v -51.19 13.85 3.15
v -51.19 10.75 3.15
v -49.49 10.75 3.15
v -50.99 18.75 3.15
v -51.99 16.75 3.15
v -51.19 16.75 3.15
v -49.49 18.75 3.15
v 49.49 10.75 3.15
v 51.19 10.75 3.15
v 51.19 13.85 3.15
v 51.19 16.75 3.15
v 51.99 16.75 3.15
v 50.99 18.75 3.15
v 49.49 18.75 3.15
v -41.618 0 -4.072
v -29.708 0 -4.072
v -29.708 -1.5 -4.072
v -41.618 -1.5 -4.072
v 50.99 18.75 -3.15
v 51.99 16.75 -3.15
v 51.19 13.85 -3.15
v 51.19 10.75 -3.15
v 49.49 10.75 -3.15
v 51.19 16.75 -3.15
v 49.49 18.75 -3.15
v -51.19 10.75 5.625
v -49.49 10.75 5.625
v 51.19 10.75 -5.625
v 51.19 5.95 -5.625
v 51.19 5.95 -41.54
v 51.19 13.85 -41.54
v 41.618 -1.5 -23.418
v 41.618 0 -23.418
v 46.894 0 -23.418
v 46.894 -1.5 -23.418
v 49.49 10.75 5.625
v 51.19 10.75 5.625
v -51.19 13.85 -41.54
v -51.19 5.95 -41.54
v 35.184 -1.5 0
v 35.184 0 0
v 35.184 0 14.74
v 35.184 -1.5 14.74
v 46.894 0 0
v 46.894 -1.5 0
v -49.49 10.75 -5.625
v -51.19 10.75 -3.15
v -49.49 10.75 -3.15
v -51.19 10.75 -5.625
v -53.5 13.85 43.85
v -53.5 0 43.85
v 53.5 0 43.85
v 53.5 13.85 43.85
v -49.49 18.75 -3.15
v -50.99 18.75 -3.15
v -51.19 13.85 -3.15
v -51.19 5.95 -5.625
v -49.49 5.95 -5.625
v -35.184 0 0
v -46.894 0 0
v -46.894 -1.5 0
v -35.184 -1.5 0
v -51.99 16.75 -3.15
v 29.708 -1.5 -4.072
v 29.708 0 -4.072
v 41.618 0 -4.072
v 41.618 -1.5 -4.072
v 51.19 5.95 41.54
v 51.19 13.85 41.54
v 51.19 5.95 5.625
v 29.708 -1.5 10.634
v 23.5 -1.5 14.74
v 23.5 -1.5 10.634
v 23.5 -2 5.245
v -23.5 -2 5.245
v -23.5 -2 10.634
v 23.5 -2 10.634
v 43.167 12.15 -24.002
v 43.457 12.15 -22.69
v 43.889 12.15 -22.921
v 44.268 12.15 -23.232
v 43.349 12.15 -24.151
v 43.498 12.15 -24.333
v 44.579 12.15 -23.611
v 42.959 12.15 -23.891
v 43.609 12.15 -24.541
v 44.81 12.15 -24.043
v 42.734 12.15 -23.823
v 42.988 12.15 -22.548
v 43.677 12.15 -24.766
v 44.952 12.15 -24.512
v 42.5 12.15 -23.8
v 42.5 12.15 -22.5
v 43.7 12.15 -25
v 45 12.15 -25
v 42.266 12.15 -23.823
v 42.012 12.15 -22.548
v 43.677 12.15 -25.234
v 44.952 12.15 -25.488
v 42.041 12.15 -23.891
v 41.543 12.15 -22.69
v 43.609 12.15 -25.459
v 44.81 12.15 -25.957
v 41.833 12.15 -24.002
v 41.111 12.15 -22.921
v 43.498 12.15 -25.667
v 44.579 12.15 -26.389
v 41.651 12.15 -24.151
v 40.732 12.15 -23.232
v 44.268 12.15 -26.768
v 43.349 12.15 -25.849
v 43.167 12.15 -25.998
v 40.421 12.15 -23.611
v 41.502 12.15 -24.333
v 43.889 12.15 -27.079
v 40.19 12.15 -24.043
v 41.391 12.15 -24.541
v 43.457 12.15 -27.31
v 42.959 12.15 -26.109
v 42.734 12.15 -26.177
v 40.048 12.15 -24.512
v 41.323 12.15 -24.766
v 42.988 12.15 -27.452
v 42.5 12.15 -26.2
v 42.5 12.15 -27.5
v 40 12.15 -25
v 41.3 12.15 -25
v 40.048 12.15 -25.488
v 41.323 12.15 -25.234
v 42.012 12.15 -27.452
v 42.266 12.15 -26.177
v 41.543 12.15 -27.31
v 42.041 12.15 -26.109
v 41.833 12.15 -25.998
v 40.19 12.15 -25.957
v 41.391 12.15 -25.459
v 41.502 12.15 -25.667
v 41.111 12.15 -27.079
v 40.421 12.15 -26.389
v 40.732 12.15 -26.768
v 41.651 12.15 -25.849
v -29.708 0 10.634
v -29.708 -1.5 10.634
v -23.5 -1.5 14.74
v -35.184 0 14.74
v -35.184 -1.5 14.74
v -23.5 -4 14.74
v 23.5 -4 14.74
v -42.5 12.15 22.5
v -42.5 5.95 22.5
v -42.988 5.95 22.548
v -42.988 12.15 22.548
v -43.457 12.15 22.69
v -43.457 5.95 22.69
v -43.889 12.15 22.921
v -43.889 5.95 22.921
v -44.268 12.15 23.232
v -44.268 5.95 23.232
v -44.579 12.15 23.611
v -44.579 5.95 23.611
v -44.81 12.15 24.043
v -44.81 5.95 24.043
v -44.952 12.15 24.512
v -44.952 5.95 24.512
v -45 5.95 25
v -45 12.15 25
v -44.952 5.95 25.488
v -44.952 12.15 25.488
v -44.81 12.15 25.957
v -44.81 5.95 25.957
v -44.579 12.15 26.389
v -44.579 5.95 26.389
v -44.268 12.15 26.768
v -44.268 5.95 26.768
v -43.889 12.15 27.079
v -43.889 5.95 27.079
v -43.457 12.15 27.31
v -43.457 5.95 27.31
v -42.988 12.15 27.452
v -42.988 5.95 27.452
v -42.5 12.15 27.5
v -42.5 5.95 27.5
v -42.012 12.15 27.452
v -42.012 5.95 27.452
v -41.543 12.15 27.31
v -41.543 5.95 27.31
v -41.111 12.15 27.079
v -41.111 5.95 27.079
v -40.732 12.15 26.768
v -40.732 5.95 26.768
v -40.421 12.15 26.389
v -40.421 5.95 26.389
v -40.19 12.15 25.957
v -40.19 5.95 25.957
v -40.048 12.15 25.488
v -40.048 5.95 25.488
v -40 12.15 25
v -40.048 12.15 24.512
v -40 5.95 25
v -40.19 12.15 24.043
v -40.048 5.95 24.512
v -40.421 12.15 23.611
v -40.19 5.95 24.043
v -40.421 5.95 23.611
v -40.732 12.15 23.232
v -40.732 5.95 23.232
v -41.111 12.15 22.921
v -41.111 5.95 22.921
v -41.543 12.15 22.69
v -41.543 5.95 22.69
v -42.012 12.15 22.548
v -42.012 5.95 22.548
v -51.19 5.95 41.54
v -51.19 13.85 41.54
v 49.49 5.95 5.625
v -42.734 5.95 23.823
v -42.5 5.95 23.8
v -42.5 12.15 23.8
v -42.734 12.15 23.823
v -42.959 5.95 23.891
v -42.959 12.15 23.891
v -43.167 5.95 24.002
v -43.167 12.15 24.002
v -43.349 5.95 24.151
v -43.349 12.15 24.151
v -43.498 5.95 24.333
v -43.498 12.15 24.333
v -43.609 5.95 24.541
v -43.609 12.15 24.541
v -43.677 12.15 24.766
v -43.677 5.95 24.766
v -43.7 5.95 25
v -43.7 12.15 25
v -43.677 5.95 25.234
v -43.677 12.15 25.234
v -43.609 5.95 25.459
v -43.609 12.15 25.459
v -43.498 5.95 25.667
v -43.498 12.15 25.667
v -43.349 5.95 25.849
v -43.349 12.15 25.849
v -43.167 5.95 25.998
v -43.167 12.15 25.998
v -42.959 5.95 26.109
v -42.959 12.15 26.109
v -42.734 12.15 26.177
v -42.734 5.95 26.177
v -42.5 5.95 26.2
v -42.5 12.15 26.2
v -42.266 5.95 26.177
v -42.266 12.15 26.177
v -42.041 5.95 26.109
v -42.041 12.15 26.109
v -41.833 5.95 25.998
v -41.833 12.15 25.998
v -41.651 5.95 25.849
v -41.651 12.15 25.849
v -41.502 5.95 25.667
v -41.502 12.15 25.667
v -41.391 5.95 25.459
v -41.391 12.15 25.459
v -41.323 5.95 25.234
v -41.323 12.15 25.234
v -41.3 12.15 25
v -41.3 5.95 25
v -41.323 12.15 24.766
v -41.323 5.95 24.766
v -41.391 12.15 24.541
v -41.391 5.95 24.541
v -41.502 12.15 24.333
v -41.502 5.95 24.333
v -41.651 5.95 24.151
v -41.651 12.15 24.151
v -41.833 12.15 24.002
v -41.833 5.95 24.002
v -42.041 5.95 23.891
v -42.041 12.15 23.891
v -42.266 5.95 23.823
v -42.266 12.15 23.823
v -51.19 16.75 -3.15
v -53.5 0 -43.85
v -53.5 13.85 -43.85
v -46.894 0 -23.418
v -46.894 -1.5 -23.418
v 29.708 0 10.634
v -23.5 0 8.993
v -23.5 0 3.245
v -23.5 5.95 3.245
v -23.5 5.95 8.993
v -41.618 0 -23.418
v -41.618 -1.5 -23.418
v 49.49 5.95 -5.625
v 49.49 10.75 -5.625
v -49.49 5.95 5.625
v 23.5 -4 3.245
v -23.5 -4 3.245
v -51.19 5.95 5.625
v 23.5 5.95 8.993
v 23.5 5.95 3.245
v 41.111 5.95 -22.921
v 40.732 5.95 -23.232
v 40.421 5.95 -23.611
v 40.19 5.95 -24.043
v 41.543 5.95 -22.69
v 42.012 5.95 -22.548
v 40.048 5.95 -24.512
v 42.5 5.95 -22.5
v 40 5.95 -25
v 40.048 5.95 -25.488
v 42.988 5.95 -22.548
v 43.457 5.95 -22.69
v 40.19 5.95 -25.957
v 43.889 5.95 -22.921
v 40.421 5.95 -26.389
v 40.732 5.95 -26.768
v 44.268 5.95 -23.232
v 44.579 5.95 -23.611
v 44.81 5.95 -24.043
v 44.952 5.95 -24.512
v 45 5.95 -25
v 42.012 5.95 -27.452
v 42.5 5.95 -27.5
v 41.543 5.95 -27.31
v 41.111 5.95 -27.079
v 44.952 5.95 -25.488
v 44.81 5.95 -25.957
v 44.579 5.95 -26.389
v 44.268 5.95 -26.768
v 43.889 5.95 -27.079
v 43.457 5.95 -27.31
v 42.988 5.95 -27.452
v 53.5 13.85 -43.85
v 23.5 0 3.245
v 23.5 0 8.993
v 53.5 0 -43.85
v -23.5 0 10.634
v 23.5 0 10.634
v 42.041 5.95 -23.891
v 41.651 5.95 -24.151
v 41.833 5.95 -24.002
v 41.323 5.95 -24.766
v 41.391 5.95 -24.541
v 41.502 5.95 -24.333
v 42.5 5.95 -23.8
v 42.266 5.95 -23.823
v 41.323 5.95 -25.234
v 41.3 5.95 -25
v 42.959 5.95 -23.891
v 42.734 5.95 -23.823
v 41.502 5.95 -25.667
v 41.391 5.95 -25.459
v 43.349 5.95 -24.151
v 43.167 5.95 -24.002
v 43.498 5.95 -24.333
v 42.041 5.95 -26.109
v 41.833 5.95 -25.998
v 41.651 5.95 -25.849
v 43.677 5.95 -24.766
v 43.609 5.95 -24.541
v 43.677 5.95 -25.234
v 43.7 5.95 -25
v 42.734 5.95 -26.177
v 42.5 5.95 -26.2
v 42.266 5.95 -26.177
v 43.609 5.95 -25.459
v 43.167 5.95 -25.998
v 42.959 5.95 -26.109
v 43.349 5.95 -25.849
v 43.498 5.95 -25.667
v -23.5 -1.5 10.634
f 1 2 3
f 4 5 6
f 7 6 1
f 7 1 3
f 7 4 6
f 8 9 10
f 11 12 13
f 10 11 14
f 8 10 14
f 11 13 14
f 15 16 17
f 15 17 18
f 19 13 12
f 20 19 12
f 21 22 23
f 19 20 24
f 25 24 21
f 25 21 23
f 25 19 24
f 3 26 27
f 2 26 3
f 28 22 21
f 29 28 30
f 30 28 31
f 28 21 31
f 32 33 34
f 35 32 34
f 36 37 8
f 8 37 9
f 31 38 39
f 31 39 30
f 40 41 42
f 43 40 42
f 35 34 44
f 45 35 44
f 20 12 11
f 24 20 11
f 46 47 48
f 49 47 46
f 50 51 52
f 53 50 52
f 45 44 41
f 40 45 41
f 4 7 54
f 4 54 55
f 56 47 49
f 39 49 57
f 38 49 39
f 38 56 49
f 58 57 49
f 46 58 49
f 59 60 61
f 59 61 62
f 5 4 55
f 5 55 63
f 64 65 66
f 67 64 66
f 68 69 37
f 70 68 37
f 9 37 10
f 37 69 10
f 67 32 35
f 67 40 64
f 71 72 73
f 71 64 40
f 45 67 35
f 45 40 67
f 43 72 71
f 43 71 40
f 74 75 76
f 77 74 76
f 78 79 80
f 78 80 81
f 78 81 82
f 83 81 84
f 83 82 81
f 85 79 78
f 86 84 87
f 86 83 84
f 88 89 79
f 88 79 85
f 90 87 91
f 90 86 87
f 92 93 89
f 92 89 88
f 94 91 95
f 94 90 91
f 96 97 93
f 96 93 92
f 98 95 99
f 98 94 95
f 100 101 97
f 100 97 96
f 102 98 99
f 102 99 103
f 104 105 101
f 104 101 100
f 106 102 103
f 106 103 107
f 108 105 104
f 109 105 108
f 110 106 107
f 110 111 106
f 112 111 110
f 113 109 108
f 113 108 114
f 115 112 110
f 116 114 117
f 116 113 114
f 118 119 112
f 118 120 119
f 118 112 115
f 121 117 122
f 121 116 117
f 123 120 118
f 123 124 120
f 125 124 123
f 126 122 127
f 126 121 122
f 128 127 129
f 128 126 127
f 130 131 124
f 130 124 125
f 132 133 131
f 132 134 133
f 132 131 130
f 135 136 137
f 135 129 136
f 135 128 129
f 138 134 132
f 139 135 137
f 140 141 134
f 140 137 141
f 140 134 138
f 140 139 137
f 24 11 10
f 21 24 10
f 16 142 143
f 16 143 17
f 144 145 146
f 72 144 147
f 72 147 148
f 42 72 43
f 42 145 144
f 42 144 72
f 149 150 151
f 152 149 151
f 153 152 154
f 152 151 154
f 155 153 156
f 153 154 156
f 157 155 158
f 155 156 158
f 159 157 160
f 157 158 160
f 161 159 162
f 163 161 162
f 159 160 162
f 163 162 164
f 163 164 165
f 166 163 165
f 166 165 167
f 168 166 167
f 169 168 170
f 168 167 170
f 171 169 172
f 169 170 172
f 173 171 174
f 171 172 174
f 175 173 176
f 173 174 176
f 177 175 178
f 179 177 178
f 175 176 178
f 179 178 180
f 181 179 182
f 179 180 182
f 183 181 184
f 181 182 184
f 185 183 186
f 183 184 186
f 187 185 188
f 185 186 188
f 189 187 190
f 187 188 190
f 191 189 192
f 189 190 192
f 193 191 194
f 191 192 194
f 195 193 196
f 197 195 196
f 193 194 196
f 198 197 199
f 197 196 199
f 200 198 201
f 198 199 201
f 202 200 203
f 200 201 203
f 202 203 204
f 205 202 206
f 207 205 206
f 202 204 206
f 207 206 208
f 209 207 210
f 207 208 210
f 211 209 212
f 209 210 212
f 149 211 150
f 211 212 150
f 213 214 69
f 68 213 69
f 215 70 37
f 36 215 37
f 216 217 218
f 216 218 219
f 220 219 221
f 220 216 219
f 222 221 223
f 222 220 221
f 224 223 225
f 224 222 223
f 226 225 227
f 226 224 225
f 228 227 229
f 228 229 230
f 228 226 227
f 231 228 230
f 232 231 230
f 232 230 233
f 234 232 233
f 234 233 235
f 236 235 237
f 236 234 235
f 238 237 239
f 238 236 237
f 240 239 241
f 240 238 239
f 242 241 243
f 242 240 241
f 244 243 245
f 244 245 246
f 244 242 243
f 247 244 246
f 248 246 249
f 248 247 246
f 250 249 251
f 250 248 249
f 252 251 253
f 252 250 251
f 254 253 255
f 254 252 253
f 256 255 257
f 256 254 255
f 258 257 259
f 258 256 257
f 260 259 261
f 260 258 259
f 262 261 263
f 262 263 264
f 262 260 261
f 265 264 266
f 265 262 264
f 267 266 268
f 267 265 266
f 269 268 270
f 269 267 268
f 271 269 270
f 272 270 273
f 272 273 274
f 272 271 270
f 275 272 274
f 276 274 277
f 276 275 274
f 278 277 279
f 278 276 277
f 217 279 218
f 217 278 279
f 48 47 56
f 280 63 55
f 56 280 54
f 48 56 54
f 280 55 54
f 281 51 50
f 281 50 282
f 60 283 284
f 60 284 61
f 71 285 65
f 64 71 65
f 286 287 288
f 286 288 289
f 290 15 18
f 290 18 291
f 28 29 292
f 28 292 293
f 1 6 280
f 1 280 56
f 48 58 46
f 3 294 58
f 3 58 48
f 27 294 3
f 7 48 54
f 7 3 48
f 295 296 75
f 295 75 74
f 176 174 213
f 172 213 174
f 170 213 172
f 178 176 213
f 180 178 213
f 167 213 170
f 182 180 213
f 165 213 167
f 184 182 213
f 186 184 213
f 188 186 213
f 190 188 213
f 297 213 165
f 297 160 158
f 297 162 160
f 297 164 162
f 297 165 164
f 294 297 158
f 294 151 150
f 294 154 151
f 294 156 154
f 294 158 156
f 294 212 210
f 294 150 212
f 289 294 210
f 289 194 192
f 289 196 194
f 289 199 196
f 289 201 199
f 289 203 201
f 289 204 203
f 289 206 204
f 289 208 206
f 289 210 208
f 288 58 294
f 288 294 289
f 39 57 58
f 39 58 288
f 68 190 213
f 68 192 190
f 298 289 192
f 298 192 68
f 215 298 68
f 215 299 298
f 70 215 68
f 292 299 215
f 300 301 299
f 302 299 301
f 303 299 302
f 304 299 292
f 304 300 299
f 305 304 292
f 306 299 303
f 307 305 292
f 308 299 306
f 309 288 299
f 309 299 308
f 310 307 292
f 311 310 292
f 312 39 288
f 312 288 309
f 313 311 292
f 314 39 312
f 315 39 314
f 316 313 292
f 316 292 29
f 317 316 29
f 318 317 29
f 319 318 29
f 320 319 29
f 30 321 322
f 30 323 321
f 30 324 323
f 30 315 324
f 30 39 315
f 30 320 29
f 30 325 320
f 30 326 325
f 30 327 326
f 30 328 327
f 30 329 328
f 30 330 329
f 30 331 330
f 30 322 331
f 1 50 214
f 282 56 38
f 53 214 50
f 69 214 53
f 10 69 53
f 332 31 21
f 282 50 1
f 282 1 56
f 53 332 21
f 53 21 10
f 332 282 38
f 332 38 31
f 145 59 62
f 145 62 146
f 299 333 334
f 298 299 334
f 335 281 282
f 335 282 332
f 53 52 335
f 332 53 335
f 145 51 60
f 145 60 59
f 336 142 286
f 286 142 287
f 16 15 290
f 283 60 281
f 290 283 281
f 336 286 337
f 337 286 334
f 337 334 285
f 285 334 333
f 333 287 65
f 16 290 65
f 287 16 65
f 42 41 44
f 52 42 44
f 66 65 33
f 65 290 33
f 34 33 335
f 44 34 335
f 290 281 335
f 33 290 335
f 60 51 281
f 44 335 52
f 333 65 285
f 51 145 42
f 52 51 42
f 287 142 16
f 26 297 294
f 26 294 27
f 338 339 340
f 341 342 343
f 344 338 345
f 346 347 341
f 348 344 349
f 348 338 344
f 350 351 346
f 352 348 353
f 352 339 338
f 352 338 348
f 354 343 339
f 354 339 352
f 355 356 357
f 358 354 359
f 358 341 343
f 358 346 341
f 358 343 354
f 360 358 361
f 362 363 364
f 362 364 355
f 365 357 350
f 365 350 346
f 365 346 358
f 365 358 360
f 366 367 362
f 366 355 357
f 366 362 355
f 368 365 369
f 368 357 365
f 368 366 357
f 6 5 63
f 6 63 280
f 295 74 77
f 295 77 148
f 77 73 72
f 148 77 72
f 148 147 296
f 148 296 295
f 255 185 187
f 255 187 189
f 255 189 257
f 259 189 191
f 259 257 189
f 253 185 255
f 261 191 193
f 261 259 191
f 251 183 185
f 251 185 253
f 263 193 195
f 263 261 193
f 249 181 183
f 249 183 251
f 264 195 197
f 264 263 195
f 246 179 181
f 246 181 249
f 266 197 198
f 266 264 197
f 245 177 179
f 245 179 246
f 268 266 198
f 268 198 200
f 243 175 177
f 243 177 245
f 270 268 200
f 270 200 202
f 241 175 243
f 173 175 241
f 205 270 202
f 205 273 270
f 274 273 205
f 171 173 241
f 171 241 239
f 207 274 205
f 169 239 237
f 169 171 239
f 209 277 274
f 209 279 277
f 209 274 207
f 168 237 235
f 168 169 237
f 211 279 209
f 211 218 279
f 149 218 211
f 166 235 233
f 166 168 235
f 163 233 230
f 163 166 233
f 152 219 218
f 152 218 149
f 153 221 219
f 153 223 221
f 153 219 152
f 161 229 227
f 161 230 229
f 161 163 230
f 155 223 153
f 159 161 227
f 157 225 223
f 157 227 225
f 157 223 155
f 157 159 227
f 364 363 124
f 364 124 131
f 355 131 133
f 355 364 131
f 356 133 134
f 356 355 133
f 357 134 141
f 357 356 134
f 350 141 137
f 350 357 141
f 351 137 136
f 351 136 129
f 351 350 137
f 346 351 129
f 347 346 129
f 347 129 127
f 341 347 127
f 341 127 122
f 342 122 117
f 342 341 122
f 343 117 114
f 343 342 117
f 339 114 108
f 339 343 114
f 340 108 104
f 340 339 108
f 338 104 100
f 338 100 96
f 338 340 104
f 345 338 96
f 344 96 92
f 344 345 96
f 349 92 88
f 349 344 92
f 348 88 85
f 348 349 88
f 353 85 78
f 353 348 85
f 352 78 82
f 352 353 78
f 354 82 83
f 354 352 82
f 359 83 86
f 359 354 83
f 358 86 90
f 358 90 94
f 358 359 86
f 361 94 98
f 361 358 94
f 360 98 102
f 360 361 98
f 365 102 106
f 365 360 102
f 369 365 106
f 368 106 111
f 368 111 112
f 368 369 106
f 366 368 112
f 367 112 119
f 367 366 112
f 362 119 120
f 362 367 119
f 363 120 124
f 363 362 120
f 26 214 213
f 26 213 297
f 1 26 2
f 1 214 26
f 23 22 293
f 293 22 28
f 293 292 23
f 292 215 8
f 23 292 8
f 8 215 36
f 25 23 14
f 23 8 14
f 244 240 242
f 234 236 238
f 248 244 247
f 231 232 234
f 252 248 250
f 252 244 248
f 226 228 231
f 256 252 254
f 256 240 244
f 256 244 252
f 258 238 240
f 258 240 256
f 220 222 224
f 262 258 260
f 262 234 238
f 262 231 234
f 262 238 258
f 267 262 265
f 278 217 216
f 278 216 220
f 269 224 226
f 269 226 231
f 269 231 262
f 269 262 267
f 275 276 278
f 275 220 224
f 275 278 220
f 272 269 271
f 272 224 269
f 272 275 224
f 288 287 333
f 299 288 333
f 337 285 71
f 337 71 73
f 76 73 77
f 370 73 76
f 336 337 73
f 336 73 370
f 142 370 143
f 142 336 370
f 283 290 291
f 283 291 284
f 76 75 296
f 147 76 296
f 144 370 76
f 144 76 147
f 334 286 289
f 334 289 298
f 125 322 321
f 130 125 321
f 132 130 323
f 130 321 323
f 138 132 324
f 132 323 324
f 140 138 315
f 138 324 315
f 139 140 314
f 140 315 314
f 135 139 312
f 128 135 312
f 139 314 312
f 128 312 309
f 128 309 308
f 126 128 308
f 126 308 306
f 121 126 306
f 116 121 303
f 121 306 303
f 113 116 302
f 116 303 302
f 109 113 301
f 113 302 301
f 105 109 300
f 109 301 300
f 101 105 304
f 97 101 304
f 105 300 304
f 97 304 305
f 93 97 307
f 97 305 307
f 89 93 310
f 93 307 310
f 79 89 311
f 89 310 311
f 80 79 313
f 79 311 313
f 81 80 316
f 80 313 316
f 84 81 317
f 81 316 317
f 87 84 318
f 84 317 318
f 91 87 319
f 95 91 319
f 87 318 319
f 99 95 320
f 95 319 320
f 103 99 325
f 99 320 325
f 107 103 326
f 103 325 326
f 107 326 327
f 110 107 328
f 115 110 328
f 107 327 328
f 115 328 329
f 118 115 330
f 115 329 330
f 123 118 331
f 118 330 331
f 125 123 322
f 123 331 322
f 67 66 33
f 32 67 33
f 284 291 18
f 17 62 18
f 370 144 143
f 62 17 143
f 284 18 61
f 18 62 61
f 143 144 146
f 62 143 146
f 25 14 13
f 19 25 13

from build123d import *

# Parameters (mm, degrees)
SKETCH1_W           = 107
SKETCH1_H           = 87.7
BOSS_EXTRUDE1_DEPTH = 13.85
SKETCH2_W           = 102.38
SKETCH2_H           = 83.08
CUT_EXTRUDE1_DEPTH  = 7.9
SKETCH4_R           = 2.5
SKETCH4_R_2         = 1.2
BOSS_EXTRUDE2_DEPTH = 6.2
SKETCH7_W           = 11.25
SKETCH7_H           = 4.8
BOSS_EXTRUDE3_DEPTH = 1.7
BOSS_EXTRUDE4_DEPTH = 3.15
SKETCH3_W           = 23.5
SKETCH3_H           = 11.494748732
BOSS_EXTRUDE5_DEPTH = 4
SKETCH9_W           = 7.388623973
SKETCH9_H           = 2
CUT_EXTRUDE2_DEPTH  = 91.572539989
SKETCH10_W          = 47
SKETCH10_H          = 5.747374366
CUT_EXTRUDE4_DEPTH  = 72.670321612
CHAMFER1_SIZE       = 2
BOSS_EXTRUDE7_DEPTH = 1.5


with BuildPart() as part:
    # Sketch1 → Boss-Extrude1 (new body)
    with BuildSketch(Plane(origin=(0, 0, 0), x_dir=(1, 0, 0), z_dir=(0, 1, 0))):
        Rectangle(SKETCH1_W, SKETCH1_H)
    extrude(amount=BOSS_EXTRUDE1_DEPTH)

    # Sketch2 → Cut-Extrude1 (cut)
    with BuildSketch(Plane(origin=(0, 13.85, 0), x_dir=(1, 0, 0), z_dir=(0, 1, 0))):
        Rectangle(SKETCH2_W, SKETCH2_H)
    extrude(amount=-CUT_EXTRUDE1_DEPTH, mode=Mode.SUBTRACT)

    # Sketch4 → Boss-Extrude2 (add)
    # profile 1 of 2: a face of its own
    with BuildSketch(Plane(origin=(0, 5.95, 0), x_dir=(1, 0, 0), z_dir=(0, 1, 0))):
        with Locations(Location((-42.5, -25, 0), (0, 0, 90))):
            Circle(SKETCH4_R)
        with Locations(Location((-42.5, -25, 0), (0, 0, 90))):
            Circle(SKETCH4_R_2, mode=Mode.SUBTRACT)
    # profile 2 of 2: a face of its own
    with BuildSketch(Plane(origin=(0, 5.95, 0), x_dir=(1, 0, 0), z_dir=(0, 1, 0))):
        with Locations(Location((42.5, 25, 0), (0, 0, 90))):
            Circle(SKETCH4_R)
        with Locations(Location((42.5, 25, 0), (0, 0, 90))):
            Circle(SKETCH4_R_2, mode=Mode.SUBTRACT)
    extrude(amount=BOSS_EXTRUDE2_DEPTH)

    # Sketch7 → Boss-Extrude3 (add)
    with BuildSketch(Plane(origin=(-51.19, 0, 0), x_dir=(0, 0, -1), z_dir=(1, 0, 0))):
        with Locations((0, 8.35)):
            Rectangle(SKETCH7_W, SKETCH7_H)
    boss_extrude3 = extrude(amount=BOSS_EXTRUDE3_DEPTH)

    # Sketch8 → Boss-Extrude4 (add, symmetric)
    with BuildSketch(Plane.XY):
        Polygon((-49.49, 10.75), (-49.49, 18.75), (-50.99, 18.75), (-51.99, 16.75), (-51.19, 16.75), (-51.19, 10.75), align=None)
    boss_extrude4 = extrude(amount=BOSS_EXTRUDE4_DEPTH, both=True)

    # Sketch3 → Boss-Extrude5 (add)
    with BuildSketch(Plane.XZ):
        with Locations((-11.75, 8.992625634)):
            Rectangle(SKETCH3_W, SKETCH3_H)
        with Locations((11.75, 8.992625634)):
            Rectangle(SKETCH3_W, SKETCH3_H)
    extrude(amount=BOSS_EXTRUDE5_DEPTH)

    # Sketch9 → Cut-Extrude2 (cut, through all)
    with BuildSketch(Plane.ZY.offset(23.5)):
        with Locations((6.939563255, -1)):
            Rectangle(SKETCH9_W, SKETCH9_H)
    extrude(amount=-CUT_EXTRUDE2_DEPTH, mode=Mode.SUBTRACT)

    # Sketch10 → Cut-Extrude4 (cut, through all)
    with BuildSketch(Plane.XZ):
        with Locations((0, 6.118938451)):
            Rectangle(SKETCH10_W, SKETCH10_H)
    extrude(amount=-CUT_EXTRUDE4_DEPTH, mode=Mode.SUBTRACT)

    # Chamfer1
    chamfer1_edges = [part.edges().sort_by_distance(p)[0] for p in [
        (0, -2, 3.245251268),
    ]]
    chamfer(chamfer1_edges, length=CHAMFER1_SIZE - 0.0001)  # a hair under: the kernel refuses the full size

    # Mirror1: Boss-Extrude3, Boss-Extrude4 across plane
    add(boss_extrude3.mirror(Plane(origin=(0, 0, 0), x_dir=(0, 0, 1), z_dir=(1, 0, 0))))
    add(boss_extrude4.mirror(Plane(origin=(0, 0, 0), x_dir=(0, 0, 1), z_dir=(1, 0, 0))))

    # Sketch14 → Boss-Extrude7 (add)
    with BuildSketch(Plane.XZ):
        Polygon((-41.618061396, -23.418064695), (-46.893526608, -23.418064695), (-46.893526608, 0), (-35.18449426, 0), (-35.18449426, 14.74), (-23.5, 14.74), (-23.5, 10.633875241), (-29.707757231, 10.633875241), (-29.707757231, -4.071607842), (-41.618061396, -4.071607842), align=None)
    boss_extrude7 = extrude(amount=BOSS_EXTRUDE7_DEPTH)

    # Mirror2: Boss-Extrude7 across plane
    add(boss_extrude7.mirror(Plane(origin=(0, 0, 0), x_dir=(0, 0, 1), z_dir=(1, 0, 0))))


solid = part.part
